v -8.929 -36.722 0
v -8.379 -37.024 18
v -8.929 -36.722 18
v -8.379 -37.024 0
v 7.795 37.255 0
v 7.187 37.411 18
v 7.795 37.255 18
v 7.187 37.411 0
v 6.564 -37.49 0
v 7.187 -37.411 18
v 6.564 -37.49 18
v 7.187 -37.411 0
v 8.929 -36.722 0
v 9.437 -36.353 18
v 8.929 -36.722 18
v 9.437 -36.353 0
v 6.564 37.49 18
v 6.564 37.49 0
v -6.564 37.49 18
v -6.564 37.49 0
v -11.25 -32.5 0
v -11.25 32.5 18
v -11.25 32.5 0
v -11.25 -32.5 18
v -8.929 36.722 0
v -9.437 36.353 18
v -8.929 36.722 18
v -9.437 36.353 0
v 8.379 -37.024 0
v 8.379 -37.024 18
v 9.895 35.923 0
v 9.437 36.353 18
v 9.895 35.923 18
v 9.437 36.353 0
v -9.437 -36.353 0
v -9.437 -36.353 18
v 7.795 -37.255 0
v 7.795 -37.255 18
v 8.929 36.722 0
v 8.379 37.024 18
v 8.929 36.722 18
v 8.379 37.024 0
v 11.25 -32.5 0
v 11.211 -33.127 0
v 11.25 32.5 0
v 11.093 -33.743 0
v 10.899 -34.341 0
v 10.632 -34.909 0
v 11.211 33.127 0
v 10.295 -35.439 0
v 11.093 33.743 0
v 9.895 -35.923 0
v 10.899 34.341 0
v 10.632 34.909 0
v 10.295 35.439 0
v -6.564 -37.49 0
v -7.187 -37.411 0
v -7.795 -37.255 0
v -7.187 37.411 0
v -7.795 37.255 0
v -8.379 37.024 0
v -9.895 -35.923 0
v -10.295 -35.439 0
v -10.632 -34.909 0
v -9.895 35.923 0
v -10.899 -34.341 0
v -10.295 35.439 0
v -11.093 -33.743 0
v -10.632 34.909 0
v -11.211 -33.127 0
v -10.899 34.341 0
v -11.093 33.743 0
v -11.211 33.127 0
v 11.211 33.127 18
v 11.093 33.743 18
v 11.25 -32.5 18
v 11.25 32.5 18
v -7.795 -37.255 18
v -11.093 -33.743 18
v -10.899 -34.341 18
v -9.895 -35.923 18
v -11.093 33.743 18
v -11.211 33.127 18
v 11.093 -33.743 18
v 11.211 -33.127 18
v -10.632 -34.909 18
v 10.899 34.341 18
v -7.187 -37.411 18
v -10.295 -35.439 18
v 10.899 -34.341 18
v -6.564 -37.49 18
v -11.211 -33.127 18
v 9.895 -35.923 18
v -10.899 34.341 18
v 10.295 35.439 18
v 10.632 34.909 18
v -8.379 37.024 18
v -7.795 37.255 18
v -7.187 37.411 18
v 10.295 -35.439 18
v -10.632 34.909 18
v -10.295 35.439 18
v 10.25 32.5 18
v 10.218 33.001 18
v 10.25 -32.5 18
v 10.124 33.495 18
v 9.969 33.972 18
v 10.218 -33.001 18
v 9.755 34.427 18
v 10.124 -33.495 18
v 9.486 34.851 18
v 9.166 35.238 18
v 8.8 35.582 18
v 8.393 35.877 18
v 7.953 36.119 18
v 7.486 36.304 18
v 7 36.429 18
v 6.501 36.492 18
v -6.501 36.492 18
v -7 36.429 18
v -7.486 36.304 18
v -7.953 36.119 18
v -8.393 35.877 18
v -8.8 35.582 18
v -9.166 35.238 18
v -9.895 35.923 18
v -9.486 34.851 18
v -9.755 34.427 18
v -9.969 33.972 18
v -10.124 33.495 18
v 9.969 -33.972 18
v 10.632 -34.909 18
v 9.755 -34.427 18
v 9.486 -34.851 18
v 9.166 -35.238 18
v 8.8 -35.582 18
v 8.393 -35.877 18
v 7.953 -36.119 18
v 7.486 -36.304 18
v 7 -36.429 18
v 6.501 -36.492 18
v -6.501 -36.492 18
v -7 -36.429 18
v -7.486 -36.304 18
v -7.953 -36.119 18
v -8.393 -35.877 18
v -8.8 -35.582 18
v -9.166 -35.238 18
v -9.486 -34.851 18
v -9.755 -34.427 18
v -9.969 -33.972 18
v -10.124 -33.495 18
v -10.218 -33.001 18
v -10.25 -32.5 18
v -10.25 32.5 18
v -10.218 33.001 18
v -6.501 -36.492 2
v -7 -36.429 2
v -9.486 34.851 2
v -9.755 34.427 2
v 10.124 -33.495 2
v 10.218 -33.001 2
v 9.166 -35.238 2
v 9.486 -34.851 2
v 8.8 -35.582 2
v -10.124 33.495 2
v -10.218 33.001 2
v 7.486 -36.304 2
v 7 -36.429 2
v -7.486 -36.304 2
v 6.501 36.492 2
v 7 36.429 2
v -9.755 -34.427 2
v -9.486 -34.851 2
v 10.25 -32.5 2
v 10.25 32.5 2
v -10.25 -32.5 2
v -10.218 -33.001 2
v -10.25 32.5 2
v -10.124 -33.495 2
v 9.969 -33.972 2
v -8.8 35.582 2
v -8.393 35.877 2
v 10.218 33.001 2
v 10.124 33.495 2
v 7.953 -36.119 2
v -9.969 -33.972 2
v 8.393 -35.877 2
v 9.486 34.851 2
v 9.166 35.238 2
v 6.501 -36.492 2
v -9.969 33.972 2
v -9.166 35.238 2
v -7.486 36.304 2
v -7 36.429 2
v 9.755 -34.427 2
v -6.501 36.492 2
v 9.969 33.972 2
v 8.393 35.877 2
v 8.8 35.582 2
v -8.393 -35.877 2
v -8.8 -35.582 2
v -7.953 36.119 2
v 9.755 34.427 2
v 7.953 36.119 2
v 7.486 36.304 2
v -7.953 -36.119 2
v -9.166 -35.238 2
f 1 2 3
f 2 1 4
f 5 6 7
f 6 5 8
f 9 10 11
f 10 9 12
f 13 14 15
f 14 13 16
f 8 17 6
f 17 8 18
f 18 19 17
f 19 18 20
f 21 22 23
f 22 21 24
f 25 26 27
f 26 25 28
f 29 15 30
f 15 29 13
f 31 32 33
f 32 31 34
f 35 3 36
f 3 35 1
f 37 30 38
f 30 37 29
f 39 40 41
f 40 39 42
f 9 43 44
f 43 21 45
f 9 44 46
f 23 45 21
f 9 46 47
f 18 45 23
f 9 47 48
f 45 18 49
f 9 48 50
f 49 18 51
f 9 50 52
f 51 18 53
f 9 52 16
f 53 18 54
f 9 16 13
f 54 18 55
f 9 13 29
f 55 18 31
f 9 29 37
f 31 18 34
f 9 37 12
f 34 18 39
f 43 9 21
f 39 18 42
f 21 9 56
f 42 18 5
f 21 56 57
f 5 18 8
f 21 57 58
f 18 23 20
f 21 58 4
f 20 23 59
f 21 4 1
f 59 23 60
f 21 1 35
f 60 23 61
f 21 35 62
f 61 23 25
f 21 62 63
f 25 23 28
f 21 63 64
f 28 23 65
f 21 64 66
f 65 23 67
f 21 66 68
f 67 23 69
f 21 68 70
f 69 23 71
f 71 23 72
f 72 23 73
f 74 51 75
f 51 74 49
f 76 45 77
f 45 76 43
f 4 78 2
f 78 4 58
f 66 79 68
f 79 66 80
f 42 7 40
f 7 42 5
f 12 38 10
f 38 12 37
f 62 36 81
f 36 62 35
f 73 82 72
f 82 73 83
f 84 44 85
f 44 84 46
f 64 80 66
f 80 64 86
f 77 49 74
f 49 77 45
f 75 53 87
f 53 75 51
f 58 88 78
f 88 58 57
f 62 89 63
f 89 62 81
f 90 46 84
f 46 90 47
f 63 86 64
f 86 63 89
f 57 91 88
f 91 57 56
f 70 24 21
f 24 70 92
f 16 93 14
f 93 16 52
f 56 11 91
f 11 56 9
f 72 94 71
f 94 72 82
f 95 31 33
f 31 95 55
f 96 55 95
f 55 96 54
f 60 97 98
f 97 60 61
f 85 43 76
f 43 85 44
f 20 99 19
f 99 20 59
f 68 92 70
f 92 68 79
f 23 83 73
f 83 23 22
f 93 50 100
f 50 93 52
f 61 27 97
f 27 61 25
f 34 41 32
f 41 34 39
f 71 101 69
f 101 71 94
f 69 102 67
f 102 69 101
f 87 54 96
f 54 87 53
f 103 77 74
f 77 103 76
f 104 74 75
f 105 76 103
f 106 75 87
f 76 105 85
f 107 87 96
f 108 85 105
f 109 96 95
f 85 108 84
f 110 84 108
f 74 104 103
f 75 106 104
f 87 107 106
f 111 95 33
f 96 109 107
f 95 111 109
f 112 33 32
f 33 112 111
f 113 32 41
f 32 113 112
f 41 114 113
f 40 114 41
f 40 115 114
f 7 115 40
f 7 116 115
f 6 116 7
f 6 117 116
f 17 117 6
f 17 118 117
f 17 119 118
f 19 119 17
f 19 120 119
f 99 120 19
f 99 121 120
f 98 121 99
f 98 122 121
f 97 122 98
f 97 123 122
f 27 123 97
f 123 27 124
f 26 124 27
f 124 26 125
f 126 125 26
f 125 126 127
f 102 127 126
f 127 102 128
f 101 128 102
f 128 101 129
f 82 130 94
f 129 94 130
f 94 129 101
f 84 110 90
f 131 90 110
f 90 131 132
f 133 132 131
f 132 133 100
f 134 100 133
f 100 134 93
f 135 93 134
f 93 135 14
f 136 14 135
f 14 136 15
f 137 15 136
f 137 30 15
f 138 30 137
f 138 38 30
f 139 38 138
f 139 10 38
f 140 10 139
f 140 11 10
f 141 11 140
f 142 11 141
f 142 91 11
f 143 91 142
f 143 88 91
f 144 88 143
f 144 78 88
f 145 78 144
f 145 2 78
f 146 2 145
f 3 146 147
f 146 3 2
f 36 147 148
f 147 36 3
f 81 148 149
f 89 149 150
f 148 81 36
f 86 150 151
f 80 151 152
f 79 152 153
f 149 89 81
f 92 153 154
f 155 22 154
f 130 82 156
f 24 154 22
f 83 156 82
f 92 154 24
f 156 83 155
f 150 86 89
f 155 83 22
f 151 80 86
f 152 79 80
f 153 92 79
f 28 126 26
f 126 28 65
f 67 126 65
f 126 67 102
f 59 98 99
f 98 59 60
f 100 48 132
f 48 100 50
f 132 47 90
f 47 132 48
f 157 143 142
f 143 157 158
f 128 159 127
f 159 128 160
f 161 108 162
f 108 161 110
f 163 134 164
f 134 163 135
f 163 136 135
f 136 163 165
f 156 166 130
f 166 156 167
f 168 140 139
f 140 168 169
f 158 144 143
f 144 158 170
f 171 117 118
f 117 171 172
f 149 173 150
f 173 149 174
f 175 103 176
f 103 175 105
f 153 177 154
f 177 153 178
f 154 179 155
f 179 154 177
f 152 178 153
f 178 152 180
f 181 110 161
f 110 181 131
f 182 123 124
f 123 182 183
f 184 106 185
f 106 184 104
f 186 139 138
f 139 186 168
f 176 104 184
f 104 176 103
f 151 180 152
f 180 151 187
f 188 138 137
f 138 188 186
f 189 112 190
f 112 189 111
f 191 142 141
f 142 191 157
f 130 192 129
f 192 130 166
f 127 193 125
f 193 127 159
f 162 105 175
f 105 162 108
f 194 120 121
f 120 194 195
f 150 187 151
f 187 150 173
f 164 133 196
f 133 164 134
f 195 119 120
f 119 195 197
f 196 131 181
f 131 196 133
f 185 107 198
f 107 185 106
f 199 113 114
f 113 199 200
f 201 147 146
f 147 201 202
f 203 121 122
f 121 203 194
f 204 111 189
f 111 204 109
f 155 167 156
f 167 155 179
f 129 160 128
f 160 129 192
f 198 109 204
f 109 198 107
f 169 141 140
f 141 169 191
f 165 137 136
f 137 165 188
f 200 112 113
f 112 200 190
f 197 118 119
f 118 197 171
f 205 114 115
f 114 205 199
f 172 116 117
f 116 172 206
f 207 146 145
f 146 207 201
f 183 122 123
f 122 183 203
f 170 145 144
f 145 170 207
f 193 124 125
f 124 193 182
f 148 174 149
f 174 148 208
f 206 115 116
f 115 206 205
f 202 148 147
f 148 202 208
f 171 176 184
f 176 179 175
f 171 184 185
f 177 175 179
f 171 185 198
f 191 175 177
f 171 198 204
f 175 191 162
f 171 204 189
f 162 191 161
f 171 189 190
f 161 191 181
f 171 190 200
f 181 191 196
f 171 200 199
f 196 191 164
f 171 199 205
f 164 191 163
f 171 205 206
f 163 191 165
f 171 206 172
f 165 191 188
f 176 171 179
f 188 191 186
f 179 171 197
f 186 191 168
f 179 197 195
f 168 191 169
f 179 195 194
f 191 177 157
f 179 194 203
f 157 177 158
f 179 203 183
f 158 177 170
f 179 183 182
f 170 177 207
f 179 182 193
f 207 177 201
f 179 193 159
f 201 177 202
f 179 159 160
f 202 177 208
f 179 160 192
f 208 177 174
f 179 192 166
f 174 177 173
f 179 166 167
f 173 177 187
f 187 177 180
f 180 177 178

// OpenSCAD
$fn = 50;


difference() {
	union() {
		hull() {
			translate(v = [-6.2500000000, 32.5000000000, 0]) {
				cylinder(h = 18, r = 5);
			}
			translate(v = [6.2500000000, 32.5000000000, 0]) {
				cylinder(h = 18, r = 5);
			}
			translate(v = [-6.2500000000, -32.5000000000, 0]) {
				cylinder(h = 18, r = 5);
			}
			translate(v = [6.2500000000, -32.5000000000, 0]) {
				cylinder(h = 18, r = 5);
			}
		}
	}
	union() {
		translate(v = [0, 0, 2]) {
			hull() {
				translate(v = [-6.2500000000, 32.5000000000, 0]) {
					cylinder(h = 16, r = 4);
				}
				translate(v = [6.2500000000, 32.5000000000, 0]) {
					cylinder(h = 16, r = 4);
				}
				translate(v = [-6.2500000000, -32.5000000000, 0]) {
					cylinder(h = 16, r = 4);
				}
				translate(v = [6.2500000000, -32.5000000000, 0]) {
					cylinder(h = 16, r = 4);
				}
			}
		}
	}
}
